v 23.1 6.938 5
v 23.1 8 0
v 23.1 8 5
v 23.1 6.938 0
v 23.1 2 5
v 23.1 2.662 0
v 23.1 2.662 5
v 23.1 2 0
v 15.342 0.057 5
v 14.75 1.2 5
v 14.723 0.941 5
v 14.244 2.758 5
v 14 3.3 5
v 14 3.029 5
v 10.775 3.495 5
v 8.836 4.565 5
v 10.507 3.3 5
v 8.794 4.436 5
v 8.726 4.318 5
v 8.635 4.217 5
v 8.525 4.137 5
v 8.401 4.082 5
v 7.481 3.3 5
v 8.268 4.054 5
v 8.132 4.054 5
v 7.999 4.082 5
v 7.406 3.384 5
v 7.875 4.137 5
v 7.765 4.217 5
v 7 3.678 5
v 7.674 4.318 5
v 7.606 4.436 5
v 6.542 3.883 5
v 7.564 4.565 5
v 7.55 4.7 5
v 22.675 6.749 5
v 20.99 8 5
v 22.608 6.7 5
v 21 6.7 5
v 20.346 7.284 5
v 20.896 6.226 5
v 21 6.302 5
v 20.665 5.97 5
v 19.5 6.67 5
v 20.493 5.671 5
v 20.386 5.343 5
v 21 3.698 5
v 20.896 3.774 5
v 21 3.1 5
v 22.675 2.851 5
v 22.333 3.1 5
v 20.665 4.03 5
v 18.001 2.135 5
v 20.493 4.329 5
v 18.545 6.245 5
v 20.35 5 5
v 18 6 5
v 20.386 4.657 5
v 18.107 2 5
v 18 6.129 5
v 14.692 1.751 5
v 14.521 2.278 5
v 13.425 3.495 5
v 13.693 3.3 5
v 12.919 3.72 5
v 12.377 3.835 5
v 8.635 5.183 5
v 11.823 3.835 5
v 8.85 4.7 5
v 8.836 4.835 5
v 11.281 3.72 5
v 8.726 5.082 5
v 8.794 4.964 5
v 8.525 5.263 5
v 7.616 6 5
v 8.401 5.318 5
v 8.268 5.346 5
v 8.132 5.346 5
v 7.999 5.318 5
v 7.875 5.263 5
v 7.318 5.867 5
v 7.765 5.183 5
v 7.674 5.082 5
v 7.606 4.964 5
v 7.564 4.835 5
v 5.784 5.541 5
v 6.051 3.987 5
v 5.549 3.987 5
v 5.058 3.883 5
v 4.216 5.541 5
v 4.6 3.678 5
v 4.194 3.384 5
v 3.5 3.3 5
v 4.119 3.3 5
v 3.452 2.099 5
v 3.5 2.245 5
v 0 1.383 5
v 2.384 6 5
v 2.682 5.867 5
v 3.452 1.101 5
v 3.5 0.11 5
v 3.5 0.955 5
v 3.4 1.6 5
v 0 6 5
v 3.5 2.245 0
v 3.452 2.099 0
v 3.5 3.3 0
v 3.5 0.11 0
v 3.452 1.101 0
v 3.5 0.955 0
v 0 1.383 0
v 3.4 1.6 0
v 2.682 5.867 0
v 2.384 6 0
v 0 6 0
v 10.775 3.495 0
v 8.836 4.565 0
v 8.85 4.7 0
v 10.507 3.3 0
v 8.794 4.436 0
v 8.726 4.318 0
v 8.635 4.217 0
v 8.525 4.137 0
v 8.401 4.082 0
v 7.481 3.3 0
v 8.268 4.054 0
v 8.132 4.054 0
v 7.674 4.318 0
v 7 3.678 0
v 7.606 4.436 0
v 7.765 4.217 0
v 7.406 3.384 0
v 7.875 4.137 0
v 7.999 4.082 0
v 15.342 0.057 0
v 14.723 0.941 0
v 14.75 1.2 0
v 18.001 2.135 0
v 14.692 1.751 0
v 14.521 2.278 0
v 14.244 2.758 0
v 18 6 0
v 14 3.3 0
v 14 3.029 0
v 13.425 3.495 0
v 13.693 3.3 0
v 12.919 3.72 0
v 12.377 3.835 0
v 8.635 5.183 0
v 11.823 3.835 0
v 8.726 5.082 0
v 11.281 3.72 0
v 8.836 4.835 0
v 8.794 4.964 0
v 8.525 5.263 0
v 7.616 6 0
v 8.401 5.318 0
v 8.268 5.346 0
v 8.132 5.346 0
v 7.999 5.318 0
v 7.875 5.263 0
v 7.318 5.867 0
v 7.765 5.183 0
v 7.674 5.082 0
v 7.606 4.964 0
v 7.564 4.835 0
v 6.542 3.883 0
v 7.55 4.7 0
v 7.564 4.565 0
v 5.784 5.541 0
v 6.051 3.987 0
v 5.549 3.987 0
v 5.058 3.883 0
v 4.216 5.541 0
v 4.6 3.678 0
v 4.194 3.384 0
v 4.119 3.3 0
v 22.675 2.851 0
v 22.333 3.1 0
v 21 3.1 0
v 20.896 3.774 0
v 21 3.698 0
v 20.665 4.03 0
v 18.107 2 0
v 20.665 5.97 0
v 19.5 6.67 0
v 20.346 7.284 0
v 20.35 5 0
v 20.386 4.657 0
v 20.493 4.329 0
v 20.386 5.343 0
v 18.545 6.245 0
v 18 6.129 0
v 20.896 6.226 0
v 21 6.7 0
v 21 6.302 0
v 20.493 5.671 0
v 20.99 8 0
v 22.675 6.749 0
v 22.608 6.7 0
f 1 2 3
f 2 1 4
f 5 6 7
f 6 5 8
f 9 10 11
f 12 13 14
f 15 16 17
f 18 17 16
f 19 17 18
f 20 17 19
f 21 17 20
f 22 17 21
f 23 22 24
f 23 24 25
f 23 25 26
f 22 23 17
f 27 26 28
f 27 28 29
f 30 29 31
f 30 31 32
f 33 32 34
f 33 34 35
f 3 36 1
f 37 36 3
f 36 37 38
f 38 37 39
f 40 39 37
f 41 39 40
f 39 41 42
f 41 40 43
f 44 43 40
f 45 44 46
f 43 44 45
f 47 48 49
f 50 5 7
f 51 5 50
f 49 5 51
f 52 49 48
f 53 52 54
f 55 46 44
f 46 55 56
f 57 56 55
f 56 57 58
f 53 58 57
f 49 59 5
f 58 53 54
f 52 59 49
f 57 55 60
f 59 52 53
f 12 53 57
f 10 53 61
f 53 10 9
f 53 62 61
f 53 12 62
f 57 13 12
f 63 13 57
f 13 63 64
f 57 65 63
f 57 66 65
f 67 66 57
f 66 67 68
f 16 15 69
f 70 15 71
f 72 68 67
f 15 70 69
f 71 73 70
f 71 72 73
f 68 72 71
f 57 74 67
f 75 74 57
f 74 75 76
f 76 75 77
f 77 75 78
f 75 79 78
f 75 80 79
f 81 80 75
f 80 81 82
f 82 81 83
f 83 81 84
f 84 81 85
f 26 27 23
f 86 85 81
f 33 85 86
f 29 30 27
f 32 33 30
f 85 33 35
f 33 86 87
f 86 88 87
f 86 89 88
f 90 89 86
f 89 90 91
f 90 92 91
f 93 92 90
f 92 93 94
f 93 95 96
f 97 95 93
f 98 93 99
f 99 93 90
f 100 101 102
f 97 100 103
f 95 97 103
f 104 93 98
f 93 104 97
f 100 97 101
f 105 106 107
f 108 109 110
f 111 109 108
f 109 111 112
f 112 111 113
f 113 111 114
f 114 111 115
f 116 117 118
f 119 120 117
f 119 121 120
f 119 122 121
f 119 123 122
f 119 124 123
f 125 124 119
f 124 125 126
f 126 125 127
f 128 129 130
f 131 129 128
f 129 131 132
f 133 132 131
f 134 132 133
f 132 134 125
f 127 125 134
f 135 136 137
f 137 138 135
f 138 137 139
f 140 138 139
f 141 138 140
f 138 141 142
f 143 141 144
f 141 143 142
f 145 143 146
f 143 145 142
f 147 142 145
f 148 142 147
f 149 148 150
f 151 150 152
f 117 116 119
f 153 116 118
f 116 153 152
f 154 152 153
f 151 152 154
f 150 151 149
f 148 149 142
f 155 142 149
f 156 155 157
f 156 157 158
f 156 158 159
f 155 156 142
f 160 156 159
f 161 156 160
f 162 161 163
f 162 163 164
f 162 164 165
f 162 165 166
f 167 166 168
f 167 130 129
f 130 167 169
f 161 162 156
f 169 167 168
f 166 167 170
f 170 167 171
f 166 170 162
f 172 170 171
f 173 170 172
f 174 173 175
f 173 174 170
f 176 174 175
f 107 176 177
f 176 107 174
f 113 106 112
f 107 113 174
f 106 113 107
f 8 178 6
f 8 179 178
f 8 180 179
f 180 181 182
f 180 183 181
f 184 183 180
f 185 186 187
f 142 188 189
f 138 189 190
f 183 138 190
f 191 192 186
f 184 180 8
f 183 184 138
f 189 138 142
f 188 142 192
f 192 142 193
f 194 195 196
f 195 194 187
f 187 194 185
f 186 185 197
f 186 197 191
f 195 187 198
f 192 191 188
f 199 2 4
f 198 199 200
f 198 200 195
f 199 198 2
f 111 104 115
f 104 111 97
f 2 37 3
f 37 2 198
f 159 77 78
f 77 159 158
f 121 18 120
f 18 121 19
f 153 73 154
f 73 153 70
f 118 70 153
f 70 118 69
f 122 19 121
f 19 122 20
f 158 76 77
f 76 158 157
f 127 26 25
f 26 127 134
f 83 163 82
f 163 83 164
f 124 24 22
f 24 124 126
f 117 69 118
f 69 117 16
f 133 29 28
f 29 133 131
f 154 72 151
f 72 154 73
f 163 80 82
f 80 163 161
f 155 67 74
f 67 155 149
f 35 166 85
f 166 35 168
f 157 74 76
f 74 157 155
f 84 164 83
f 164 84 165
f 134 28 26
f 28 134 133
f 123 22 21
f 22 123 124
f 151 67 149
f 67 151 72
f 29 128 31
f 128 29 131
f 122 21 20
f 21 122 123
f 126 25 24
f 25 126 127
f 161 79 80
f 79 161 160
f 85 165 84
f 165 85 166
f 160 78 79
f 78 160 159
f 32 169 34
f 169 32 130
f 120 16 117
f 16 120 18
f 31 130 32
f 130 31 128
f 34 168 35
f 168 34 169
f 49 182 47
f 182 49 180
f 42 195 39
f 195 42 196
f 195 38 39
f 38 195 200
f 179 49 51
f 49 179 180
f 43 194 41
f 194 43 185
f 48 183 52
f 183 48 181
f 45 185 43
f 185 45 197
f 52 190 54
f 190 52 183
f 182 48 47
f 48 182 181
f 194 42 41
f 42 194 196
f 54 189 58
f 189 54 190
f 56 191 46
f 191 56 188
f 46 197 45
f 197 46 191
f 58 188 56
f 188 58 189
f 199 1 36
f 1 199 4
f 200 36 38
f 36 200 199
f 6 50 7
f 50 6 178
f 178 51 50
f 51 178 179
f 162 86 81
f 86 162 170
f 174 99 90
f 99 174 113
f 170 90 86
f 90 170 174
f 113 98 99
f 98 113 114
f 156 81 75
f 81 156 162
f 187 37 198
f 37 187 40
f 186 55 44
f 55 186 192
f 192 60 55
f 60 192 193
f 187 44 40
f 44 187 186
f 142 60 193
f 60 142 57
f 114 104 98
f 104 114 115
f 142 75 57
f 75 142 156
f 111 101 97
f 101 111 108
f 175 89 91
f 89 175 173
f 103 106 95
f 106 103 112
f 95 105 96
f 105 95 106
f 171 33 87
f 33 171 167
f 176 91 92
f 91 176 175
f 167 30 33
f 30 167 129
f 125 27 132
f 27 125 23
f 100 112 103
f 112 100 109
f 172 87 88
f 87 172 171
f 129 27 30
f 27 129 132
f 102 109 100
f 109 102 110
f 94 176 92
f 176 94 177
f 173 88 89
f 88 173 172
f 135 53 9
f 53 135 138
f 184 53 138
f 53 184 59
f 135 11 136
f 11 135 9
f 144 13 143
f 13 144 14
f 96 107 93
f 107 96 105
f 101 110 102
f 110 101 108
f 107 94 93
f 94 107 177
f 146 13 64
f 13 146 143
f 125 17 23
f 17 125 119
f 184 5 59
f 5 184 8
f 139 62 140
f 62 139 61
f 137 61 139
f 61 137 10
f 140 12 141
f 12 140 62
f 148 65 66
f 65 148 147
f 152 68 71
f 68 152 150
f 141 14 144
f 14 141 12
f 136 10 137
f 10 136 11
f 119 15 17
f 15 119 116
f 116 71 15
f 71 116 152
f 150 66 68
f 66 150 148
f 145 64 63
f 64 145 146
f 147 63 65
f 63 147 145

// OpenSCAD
// ancre__dfl
// D. Lorentzen
// escapement for Gyrotourbillon

$fn=30;

difference() {
    cube([23.1,8,5]);
    
    translate([8.2,4.7,0]) cylinder(h=5,d=1.3,center=false); // pivot hole
    translate([21,3.1,0]) cube([3.5,3.6,7]); //cut-out on end
    translate([22,5,0]) cylinder(h=5,d=3.3,center=false); // cut-out on end
    translate([23.8,4.8,0]) #cylinder(h=5,d=4.5,center=false); // cut-out on end
    translate([5,13,0]) cylinder(h=5,d=15,center=false); // cut-out on side
    translate([17,11,0]) cylinder(h=5,d=10,center=false); // cut-out on side
    translate([0,6,0]) cube([18,2,5]); // side 



        rotate([0,0,-20]) translate([-1.5,-1.2,0]) cube([6,2.5,5]); // shape near "tooth"
        translate([5.8,1.6,0]) cylinder(h=5,d=4.8,center=false); // cut-out on side near tooth
        rotate([0,0,-52]) translate([9.4,12.1,0]) cube([2.3,3.4,5]); // far shape far "tooth"
        rotate([0,0,35]) translate([10.8,-10.2,0]) cube([1.8,3.3,5]); // near shape far "tooth"
        translate([3.5,0,0]) cube([10.5,3.3,5]); // shape far "tooth"
        translate([18,0,0]) cube([8,2,5]); // shape far "tooth"
        translate([12.1,1.2,0]) cylinder(h=5,d=5.3,center=false); // cut-out on side far tooth

//        translate([0,0,0]) cube([15,.3,5]); // shape near and far "tooth"

    }
